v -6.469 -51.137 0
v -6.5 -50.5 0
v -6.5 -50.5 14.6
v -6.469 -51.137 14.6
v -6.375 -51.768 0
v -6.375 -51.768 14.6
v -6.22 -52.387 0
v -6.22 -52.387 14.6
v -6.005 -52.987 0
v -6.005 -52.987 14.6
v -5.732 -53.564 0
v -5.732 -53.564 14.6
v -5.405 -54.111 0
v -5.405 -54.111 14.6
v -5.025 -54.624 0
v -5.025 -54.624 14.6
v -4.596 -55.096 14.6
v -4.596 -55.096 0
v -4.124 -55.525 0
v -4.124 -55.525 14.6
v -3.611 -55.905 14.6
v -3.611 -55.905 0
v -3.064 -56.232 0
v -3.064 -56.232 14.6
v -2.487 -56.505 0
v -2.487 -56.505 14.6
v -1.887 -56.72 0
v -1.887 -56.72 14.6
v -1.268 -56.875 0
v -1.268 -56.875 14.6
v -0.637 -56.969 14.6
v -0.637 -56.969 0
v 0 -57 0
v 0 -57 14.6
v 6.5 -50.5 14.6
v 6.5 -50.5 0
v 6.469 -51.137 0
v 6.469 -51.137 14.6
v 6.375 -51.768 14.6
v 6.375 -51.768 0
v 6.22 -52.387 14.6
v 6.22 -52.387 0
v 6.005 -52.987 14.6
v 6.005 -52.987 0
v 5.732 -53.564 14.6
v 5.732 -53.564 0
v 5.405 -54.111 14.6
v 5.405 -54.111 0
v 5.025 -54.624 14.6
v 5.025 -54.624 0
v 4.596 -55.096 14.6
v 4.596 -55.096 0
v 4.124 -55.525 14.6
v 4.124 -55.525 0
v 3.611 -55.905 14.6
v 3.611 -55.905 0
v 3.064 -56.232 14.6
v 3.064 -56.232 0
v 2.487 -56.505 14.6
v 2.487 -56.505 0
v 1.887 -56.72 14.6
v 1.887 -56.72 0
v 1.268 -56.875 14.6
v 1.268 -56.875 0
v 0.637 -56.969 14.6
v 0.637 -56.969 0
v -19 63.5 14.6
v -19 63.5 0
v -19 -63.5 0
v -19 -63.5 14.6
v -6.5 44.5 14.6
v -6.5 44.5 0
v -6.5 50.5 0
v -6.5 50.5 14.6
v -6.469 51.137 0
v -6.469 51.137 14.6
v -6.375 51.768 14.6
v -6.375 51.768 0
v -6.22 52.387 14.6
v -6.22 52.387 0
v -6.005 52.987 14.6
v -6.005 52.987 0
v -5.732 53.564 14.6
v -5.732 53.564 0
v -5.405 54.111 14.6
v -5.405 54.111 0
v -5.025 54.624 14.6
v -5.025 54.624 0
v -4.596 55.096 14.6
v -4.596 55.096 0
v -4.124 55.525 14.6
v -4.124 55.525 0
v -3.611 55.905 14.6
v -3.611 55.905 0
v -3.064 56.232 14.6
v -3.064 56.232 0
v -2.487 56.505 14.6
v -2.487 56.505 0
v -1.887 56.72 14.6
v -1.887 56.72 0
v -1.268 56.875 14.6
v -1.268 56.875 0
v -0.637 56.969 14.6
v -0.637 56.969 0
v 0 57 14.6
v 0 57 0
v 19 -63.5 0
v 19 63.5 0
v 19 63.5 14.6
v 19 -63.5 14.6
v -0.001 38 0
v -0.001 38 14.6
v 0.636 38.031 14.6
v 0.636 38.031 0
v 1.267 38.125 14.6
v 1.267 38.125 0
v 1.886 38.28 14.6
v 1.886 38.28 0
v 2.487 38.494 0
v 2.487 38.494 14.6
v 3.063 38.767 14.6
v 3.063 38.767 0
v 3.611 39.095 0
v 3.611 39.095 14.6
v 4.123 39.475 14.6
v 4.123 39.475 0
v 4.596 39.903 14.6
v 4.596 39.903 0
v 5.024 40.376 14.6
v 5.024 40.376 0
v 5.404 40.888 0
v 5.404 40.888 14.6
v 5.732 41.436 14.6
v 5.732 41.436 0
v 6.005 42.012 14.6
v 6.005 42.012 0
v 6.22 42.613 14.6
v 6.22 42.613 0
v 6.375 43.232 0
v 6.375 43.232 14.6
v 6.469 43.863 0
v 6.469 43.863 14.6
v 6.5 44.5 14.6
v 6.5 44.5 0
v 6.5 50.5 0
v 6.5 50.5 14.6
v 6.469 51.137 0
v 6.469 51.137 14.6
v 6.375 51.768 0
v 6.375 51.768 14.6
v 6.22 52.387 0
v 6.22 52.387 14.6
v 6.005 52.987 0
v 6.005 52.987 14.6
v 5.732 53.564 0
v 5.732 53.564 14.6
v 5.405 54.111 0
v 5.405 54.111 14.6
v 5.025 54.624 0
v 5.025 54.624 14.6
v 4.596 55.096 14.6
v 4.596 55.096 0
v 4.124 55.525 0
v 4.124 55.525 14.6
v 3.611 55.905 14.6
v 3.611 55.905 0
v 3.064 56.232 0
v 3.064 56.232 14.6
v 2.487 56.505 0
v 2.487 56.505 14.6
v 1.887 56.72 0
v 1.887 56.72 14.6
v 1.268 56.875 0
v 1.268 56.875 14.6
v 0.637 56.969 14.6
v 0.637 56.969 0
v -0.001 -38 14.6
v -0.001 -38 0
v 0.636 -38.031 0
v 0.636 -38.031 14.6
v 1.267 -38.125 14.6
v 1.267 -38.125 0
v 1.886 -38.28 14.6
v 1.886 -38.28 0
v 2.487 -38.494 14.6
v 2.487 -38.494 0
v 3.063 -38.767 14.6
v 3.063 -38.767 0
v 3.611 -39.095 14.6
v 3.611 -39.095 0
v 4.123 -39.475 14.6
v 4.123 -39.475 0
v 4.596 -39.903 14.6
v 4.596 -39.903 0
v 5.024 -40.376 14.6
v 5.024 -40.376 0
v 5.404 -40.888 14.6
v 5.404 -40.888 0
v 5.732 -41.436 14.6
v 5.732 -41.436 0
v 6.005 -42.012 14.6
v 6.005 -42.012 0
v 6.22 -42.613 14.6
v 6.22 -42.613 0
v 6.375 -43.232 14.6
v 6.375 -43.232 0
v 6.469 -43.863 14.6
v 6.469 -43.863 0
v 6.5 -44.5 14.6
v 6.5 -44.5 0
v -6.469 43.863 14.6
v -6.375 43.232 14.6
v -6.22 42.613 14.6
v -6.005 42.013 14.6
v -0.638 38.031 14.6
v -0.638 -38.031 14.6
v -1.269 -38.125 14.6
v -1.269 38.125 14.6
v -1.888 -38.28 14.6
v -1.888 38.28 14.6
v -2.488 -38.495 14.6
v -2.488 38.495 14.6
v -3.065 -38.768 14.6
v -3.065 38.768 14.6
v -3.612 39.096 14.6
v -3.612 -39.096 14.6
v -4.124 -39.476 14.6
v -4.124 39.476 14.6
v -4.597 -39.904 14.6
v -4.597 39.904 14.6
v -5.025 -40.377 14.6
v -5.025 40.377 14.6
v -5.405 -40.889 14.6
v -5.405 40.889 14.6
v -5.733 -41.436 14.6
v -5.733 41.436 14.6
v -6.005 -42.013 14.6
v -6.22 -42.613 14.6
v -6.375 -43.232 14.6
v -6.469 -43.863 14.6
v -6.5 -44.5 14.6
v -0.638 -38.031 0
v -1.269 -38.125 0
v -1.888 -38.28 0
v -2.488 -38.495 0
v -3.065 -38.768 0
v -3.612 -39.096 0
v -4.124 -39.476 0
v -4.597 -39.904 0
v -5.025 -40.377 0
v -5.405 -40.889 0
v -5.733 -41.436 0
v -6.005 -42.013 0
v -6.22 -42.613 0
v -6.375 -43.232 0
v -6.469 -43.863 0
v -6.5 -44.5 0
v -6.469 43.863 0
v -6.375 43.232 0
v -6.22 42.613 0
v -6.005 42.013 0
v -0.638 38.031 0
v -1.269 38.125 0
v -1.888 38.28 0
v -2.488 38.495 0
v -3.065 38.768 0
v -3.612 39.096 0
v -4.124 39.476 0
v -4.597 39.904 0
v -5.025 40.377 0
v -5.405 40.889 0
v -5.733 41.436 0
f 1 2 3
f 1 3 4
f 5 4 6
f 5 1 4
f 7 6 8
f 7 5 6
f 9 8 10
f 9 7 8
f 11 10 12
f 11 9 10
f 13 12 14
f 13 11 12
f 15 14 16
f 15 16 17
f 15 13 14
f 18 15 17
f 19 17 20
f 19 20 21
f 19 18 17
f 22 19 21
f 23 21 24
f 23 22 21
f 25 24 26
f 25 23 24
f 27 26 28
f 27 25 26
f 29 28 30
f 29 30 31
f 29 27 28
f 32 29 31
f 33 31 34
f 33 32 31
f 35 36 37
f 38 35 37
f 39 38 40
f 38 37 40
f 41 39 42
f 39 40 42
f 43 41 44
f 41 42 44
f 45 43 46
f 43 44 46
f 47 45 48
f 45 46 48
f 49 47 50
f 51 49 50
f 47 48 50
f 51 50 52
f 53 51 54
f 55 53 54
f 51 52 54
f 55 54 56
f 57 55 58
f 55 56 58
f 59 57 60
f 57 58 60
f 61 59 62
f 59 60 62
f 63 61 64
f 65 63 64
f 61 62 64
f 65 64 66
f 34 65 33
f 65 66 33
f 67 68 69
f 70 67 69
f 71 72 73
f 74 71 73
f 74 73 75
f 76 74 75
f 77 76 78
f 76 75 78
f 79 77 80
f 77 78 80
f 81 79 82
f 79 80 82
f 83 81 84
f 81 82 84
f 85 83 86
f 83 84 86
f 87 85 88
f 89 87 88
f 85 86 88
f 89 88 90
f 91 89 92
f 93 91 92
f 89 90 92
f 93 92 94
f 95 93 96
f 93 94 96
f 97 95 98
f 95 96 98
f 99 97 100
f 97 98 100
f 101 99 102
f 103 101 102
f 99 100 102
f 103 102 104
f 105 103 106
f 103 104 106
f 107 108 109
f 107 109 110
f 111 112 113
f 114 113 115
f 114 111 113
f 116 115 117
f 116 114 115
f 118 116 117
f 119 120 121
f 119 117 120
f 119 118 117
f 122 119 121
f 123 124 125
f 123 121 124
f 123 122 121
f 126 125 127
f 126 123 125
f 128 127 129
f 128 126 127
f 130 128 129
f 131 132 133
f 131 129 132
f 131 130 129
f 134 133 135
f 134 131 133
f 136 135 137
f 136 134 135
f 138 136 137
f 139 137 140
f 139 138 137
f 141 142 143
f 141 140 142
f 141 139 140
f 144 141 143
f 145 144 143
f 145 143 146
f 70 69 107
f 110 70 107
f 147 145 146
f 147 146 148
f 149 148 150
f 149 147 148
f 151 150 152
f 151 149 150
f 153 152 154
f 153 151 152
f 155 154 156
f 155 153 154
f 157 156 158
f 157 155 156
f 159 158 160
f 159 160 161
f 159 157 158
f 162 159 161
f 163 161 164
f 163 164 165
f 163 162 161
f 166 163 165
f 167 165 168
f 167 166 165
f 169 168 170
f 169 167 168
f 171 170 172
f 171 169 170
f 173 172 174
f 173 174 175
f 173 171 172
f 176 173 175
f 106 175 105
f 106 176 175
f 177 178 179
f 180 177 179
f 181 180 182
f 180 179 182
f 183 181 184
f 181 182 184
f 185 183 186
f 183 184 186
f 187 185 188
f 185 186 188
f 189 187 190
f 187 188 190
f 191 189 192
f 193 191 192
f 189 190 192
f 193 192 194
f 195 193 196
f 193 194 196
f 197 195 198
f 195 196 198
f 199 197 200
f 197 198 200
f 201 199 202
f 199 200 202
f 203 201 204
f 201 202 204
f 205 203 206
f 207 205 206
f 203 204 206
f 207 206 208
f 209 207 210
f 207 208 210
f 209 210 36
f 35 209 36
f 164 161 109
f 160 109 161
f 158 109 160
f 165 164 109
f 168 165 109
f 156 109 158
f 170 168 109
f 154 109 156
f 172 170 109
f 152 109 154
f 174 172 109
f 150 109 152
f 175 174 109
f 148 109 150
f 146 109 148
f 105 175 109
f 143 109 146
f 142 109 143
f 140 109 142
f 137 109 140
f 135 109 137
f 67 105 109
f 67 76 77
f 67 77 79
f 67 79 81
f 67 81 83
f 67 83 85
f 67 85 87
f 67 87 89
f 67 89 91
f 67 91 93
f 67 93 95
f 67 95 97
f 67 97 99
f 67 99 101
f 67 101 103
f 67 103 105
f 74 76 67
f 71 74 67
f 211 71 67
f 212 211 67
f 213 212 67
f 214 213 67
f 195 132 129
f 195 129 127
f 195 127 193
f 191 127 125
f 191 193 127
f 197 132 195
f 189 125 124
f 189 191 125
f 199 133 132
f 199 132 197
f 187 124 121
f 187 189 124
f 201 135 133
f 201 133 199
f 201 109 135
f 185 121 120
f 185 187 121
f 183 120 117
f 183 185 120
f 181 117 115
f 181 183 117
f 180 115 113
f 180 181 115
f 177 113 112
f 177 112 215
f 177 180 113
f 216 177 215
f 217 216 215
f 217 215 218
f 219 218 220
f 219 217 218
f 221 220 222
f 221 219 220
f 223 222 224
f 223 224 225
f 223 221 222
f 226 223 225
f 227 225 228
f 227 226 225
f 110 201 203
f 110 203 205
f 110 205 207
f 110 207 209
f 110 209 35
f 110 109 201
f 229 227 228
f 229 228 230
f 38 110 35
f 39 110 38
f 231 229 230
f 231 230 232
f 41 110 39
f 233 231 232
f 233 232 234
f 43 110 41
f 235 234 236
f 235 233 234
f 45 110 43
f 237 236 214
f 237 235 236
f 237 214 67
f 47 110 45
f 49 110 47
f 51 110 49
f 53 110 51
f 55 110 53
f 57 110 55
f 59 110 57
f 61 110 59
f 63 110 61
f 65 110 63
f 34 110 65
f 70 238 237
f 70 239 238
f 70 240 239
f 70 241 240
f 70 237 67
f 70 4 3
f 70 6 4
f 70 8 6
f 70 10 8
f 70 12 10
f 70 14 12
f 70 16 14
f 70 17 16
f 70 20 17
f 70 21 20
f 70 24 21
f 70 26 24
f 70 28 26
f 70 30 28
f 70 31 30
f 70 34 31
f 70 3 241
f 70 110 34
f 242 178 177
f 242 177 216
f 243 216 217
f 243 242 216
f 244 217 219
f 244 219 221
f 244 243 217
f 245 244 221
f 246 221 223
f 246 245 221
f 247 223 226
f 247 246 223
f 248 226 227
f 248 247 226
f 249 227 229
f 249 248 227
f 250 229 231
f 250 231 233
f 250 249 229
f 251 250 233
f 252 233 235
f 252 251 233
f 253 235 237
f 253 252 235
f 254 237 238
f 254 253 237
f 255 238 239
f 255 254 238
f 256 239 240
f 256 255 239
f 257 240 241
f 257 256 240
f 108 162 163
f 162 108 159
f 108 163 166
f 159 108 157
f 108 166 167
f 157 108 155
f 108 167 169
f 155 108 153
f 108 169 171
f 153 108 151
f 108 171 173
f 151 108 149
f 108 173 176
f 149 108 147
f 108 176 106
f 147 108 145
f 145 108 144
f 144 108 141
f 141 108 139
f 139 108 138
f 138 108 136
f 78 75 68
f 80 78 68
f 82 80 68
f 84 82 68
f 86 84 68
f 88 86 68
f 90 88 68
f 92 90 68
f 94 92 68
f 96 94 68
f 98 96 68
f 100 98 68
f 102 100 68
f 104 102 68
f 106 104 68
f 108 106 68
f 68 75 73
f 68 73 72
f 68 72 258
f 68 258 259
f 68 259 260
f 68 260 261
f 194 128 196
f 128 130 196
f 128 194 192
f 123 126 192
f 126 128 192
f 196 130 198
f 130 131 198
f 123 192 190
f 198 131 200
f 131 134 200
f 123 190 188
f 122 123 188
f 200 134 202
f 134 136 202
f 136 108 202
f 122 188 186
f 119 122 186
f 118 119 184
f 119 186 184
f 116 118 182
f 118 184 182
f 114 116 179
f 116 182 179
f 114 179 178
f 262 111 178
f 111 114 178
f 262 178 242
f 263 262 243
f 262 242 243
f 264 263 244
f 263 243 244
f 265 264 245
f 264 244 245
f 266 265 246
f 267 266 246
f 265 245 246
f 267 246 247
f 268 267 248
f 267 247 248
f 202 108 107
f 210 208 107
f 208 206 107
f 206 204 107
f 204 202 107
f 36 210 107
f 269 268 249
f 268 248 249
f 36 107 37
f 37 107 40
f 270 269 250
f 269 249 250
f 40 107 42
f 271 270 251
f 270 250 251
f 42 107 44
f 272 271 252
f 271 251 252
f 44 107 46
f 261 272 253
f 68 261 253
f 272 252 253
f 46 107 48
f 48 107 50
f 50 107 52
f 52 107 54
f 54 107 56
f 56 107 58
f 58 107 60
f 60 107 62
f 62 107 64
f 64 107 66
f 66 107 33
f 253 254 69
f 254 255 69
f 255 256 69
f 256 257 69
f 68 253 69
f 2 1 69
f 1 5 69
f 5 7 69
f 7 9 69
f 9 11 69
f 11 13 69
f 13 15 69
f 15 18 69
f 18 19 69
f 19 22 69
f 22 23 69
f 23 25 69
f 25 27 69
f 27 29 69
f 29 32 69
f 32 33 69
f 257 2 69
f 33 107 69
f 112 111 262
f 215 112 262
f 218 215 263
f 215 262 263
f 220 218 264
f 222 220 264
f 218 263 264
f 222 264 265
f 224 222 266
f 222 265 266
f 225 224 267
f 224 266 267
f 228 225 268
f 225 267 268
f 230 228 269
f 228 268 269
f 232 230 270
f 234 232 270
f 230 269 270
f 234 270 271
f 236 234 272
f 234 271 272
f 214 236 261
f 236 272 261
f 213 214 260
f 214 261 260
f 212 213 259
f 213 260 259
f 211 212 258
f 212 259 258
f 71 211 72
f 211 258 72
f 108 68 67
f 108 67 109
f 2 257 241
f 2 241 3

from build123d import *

# Parameters (mm, degrees)
PAD007_DEPTH               = 14.6
PAD007_MIRRORED004_2_DEPTH = 14.6


with BuildPart() as part:
    # Sketch007 → Pad007 (new body)
    with BuildSketch(Plane.XY):
        with BuildLine():
            Line((0, 0), (19, 0))
            Line((19, 0), (19, 63.5))
            Line((19, 63.5), (0, 63.5))
            Line((0, 63.5), (0, 57))
            ThreePointArc((6.5, 50.5), (4.596194, 55.096194), (0, 57))
            Line((6.5, 44.5), (6.5, 50.5))
            ThreePointArc((-0.001235, 38), (4.595757, 39.903369), (6.5, 44.5))
            Line((-0.001235, 38), (0, 0))
        make_face()
    pad007 = extrude(amount=PAD007_DEPTH)

    # Sketch007 Mirrored004 2 → Pad007 Mirrored004 2 (add)
    with BuildSketch(Plane(origin=(0, 0, 0), x_dir=(-1, 0, 0), z_dir=(0, 0, -1))):
        with BuildLine():
            Line((0, 0), (19, 0))
            Line((19, 0), (19, 63.5))
            Line((19, 63.5), (0, 63.5))
            Line((0, 63.5), (0, 57))
            ThreePointArc((6.5, 50.5), (4.596194, 55.096194), (0, 57))
            Line((6.5, 44.5), (6.5, 50.5))
            ThreePointArc((-0.001235, 38), (4.595757, 39.903369), (6.5, 44.5))
            Line((-0.001235, 38), (0, 0))
        make_face()
    pad007_mirrored004_2 = extrude(amount=-PAD007_MIRRORED004_2_DEPTH)

    # Mirrored005: Pad007, Pad007 Mirrored004 2 across Sketch007 H_Axis
    add(pad007.mirror(Plane.ZX))
    add(pad007_mirrored004_2.mirror(Plane.ZX))


solid = part.part
